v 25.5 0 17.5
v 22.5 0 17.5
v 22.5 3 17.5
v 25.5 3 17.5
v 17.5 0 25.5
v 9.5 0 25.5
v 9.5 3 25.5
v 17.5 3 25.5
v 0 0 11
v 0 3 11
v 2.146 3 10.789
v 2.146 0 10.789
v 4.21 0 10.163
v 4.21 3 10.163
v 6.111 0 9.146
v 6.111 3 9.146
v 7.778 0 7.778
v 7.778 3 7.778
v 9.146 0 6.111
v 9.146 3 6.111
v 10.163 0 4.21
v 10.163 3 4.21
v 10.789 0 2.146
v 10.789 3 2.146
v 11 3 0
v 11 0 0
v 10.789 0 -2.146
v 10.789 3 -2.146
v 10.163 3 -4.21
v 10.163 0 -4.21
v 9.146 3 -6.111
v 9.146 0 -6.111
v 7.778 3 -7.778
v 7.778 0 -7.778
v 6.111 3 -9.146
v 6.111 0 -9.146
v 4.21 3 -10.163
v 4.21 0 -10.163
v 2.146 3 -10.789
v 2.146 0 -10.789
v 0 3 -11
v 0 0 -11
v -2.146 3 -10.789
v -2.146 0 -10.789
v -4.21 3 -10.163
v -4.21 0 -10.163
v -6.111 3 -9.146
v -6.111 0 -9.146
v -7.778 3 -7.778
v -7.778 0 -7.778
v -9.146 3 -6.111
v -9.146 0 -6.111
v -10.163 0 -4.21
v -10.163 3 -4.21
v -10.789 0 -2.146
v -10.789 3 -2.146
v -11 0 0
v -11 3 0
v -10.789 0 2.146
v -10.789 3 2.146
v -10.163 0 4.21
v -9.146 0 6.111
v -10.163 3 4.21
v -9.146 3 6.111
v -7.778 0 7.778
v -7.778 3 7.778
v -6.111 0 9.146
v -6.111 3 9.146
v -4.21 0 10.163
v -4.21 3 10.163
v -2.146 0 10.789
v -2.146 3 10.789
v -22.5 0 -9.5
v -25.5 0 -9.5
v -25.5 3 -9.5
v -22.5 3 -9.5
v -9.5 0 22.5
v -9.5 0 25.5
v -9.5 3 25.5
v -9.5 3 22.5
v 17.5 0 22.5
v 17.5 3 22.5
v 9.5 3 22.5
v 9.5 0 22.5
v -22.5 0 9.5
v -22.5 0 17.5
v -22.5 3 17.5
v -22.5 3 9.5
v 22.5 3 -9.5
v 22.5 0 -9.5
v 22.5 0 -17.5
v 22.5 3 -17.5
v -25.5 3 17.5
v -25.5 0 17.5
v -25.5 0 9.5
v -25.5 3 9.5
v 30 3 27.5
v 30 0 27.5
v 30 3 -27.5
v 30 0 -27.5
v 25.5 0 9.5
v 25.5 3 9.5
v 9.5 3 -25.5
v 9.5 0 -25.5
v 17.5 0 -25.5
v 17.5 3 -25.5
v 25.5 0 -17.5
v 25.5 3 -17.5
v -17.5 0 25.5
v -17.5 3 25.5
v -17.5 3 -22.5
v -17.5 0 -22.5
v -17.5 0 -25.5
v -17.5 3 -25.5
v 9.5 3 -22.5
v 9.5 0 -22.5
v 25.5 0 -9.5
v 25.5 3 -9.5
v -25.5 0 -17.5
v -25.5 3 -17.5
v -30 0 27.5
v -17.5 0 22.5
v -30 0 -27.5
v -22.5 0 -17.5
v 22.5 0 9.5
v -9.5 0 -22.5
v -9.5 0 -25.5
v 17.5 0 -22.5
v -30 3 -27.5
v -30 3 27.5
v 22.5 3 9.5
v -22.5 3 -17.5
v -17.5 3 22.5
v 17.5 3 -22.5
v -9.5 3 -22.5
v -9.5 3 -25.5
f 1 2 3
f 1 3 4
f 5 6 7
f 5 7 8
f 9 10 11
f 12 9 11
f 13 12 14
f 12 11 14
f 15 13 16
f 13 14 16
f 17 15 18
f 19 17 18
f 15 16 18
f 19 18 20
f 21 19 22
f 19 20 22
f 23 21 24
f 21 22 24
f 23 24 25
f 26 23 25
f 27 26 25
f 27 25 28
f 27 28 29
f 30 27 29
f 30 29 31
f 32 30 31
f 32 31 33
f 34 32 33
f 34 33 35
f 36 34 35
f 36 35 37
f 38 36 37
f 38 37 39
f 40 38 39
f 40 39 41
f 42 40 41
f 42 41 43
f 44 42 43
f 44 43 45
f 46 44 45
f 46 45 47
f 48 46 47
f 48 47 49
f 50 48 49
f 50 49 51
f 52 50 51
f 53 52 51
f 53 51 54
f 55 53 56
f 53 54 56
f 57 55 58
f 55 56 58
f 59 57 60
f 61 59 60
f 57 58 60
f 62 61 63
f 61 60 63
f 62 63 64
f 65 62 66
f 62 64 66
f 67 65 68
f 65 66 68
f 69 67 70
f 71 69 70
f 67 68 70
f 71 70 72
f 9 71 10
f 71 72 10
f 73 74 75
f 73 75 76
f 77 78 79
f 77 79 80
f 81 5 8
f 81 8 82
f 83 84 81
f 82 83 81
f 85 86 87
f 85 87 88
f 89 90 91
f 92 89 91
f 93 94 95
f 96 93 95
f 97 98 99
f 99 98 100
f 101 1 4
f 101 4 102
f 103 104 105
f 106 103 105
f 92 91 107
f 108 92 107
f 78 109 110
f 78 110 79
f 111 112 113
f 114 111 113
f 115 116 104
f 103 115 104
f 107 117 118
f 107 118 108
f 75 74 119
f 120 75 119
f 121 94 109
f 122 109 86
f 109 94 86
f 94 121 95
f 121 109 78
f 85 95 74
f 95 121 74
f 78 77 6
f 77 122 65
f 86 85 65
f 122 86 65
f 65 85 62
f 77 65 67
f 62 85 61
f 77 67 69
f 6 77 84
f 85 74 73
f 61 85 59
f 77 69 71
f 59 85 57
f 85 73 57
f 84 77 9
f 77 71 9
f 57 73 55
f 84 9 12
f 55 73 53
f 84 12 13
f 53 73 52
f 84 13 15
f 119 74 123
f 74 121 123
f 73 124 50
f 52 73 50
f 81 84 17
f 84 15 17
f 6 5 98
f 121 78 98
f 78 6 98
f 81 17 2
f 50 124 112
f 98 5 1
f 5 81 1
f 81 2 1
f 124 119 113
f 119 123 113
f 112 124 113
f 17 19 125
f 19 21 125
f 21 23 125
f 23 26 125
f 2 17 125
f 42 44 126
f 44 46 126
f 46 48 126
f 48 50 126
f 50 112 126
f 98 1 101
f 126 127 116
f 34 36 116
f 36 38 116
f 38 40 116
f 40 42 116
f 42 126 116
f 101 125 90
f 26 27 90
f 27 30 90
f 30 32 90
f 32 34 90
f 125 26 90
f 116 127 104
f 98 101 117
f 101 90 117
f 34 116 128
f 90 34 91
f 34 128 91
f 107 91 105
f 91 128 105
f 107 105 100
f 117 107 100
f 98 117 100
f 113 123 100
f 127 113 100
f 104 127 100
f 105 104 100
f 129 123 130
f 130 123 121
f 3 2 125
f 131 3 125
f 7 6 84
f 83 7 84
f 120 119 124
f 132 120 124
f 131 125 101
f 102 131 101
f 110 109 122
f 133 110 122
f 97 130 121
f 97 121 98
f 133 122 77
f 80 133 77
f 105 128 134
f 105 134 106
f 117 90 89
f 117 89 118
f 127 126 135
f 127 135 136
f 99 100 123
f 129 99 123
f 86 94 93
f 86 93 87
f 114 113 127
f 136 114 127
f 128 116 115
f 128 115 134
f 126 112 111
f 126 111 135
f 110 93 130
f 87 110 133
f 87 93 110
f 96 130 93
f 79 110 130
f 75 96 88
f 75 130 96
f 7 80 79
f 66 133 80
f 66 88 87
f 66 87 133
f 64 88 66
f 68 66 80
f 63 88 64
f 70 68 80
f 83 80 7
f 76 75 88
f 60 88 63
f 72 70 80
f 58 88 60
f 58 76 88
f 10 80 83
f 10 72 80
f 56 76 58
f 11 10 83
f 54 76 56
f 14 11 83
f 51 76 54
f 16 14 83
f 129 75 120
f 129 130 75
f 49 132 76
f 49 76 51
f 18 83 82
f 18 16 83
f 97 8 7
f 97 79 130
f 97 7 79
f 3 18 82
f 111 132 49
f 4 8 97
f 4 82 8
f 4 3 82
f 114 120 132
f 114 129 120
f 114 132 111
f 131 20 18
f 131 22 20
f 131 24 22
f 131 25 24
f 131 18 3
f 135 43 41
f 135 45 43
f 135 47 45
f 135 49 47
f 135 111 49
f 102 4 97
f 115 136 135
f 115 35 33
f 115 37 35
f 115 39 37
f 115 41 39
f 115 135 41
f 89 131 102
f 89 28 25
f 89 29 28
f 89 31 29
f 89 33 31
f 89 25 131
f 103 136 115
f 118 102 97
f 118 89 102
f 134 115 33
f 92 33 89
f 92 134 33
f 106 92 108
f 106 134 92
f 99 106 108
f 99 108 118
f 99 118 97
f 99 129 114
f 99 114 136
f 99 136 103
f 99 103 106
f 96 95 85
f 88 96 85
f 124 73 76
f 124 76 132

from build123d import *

# Parameters (mm, degrees)
SKETCH_1_R          = 2
SKETCH_1_W          = 3
SKETCH_1_H          = 8
SKETCH_1_W_2        = 8
SKETCH_1_H_2        = 3
EXTRUDE_1_DEPTH     = 3
SKETCH_2_W          = 60
SKETCH_2_H          = 50
CUT_EXTRUDE_1_DEPTH = 10
SKETCH_3_R          = 11
CUT_EXTRUDE_2_DEPTH = 10


with BuildPart() as part:
    # 草图1 → 凸台-拉伸1 (new body)
    with BuildSketch(Plane(origin=(0, 0, 0), x_dir=(1, 0, 0), z_dir=(0, 1, 0))):
        Polygon((-30, -27.5), (-10, -72.5), (10, -72.5), (30, -27.5), (30, 27.5), (-30, 27.5), align=None)
        with Locations(Location((0, -37.5, 0), (0, 0, 270))):
            Circle(SKETCH_1_R, mode=Mode.SUBTRACT)
        with Locations(Location((0, -57.5, 0), (0, 0, 270))):
            Circle(SKETCH_1_R, mode=Mode.SUBTRACT)
        with Locations((-24, 13.5)):
            Rectangle(SKETCH_1_W, SKETCH_1_H, mode=Mode.SUBTRACT)
        with Locations((-24, -13.5)):
            Rectangle(SKETCH_1_W, SKETCH_1_H, mode=Mode.SUBTRACT)
        with Locations((13.5, 24)):
            Rectangle(SKETCH_1_W_2, SKETCH_1_H_2, mode=Mode.SUBTRACT)
        with Locations((-13.5, 24)):
            Rectangle(SKETCH_1_W_2, SKETCH_1_H_2, mode=Mode.SUBTRACT)
        with Locations((-13.5, -24)):
            Rectangle(SKETCH_1_W_2, SKETCH_1_H_2, mode=Mode.SUBTRACT)
        with Locations((13.5, -24)):
            Rectangle(SKETCH_1_W_2, SKETCH_1_H_2, mode=Mode.SUBTRACT)
        with Locations((24, 13.5)):
            Rectangle(SKETCH_1_W, SKETCH_1_H, mode=Mode.SUBTRACT)
        with Locations((24, -13.5)):
            Rectangle(SKETCH_1_W, SKETCH_1_H, mode=Mode.SUBTRACT)
    extrude(amount=EXTRUDE_1_DEPTH)

    # 草图2 → 切除-拉伸1 (cut)
    with BuildSketch(Plane(origin=(0, 3, 0), x_dir=(1, 0, 0), z_dir=(0, 1, 0))):
        with Locations((0, -52.5)):
            Rectangle(SKETCH_2_W, SKETCH_2_H)
    extrude(amount=-CUT_EXTRUDE_1_DEPTH, mode=Mode.SUBTRACT)

    # 草图3 → 切除-拉伸2 (cut)
    with BuildSketch(Plane(origin=(0, 3, 0), x_dir=(1, 0, 0), z_dir=(0, 1, 0))):
        with Locations(Location((0, 0, 0), (0, 0, 270))):
            Circle(SKETCH_3_R)
    extrude(amount=-CUT_EXTRUDE_2_DEPTH, mode=Mode.SUBTRACT)


solid = part.part
